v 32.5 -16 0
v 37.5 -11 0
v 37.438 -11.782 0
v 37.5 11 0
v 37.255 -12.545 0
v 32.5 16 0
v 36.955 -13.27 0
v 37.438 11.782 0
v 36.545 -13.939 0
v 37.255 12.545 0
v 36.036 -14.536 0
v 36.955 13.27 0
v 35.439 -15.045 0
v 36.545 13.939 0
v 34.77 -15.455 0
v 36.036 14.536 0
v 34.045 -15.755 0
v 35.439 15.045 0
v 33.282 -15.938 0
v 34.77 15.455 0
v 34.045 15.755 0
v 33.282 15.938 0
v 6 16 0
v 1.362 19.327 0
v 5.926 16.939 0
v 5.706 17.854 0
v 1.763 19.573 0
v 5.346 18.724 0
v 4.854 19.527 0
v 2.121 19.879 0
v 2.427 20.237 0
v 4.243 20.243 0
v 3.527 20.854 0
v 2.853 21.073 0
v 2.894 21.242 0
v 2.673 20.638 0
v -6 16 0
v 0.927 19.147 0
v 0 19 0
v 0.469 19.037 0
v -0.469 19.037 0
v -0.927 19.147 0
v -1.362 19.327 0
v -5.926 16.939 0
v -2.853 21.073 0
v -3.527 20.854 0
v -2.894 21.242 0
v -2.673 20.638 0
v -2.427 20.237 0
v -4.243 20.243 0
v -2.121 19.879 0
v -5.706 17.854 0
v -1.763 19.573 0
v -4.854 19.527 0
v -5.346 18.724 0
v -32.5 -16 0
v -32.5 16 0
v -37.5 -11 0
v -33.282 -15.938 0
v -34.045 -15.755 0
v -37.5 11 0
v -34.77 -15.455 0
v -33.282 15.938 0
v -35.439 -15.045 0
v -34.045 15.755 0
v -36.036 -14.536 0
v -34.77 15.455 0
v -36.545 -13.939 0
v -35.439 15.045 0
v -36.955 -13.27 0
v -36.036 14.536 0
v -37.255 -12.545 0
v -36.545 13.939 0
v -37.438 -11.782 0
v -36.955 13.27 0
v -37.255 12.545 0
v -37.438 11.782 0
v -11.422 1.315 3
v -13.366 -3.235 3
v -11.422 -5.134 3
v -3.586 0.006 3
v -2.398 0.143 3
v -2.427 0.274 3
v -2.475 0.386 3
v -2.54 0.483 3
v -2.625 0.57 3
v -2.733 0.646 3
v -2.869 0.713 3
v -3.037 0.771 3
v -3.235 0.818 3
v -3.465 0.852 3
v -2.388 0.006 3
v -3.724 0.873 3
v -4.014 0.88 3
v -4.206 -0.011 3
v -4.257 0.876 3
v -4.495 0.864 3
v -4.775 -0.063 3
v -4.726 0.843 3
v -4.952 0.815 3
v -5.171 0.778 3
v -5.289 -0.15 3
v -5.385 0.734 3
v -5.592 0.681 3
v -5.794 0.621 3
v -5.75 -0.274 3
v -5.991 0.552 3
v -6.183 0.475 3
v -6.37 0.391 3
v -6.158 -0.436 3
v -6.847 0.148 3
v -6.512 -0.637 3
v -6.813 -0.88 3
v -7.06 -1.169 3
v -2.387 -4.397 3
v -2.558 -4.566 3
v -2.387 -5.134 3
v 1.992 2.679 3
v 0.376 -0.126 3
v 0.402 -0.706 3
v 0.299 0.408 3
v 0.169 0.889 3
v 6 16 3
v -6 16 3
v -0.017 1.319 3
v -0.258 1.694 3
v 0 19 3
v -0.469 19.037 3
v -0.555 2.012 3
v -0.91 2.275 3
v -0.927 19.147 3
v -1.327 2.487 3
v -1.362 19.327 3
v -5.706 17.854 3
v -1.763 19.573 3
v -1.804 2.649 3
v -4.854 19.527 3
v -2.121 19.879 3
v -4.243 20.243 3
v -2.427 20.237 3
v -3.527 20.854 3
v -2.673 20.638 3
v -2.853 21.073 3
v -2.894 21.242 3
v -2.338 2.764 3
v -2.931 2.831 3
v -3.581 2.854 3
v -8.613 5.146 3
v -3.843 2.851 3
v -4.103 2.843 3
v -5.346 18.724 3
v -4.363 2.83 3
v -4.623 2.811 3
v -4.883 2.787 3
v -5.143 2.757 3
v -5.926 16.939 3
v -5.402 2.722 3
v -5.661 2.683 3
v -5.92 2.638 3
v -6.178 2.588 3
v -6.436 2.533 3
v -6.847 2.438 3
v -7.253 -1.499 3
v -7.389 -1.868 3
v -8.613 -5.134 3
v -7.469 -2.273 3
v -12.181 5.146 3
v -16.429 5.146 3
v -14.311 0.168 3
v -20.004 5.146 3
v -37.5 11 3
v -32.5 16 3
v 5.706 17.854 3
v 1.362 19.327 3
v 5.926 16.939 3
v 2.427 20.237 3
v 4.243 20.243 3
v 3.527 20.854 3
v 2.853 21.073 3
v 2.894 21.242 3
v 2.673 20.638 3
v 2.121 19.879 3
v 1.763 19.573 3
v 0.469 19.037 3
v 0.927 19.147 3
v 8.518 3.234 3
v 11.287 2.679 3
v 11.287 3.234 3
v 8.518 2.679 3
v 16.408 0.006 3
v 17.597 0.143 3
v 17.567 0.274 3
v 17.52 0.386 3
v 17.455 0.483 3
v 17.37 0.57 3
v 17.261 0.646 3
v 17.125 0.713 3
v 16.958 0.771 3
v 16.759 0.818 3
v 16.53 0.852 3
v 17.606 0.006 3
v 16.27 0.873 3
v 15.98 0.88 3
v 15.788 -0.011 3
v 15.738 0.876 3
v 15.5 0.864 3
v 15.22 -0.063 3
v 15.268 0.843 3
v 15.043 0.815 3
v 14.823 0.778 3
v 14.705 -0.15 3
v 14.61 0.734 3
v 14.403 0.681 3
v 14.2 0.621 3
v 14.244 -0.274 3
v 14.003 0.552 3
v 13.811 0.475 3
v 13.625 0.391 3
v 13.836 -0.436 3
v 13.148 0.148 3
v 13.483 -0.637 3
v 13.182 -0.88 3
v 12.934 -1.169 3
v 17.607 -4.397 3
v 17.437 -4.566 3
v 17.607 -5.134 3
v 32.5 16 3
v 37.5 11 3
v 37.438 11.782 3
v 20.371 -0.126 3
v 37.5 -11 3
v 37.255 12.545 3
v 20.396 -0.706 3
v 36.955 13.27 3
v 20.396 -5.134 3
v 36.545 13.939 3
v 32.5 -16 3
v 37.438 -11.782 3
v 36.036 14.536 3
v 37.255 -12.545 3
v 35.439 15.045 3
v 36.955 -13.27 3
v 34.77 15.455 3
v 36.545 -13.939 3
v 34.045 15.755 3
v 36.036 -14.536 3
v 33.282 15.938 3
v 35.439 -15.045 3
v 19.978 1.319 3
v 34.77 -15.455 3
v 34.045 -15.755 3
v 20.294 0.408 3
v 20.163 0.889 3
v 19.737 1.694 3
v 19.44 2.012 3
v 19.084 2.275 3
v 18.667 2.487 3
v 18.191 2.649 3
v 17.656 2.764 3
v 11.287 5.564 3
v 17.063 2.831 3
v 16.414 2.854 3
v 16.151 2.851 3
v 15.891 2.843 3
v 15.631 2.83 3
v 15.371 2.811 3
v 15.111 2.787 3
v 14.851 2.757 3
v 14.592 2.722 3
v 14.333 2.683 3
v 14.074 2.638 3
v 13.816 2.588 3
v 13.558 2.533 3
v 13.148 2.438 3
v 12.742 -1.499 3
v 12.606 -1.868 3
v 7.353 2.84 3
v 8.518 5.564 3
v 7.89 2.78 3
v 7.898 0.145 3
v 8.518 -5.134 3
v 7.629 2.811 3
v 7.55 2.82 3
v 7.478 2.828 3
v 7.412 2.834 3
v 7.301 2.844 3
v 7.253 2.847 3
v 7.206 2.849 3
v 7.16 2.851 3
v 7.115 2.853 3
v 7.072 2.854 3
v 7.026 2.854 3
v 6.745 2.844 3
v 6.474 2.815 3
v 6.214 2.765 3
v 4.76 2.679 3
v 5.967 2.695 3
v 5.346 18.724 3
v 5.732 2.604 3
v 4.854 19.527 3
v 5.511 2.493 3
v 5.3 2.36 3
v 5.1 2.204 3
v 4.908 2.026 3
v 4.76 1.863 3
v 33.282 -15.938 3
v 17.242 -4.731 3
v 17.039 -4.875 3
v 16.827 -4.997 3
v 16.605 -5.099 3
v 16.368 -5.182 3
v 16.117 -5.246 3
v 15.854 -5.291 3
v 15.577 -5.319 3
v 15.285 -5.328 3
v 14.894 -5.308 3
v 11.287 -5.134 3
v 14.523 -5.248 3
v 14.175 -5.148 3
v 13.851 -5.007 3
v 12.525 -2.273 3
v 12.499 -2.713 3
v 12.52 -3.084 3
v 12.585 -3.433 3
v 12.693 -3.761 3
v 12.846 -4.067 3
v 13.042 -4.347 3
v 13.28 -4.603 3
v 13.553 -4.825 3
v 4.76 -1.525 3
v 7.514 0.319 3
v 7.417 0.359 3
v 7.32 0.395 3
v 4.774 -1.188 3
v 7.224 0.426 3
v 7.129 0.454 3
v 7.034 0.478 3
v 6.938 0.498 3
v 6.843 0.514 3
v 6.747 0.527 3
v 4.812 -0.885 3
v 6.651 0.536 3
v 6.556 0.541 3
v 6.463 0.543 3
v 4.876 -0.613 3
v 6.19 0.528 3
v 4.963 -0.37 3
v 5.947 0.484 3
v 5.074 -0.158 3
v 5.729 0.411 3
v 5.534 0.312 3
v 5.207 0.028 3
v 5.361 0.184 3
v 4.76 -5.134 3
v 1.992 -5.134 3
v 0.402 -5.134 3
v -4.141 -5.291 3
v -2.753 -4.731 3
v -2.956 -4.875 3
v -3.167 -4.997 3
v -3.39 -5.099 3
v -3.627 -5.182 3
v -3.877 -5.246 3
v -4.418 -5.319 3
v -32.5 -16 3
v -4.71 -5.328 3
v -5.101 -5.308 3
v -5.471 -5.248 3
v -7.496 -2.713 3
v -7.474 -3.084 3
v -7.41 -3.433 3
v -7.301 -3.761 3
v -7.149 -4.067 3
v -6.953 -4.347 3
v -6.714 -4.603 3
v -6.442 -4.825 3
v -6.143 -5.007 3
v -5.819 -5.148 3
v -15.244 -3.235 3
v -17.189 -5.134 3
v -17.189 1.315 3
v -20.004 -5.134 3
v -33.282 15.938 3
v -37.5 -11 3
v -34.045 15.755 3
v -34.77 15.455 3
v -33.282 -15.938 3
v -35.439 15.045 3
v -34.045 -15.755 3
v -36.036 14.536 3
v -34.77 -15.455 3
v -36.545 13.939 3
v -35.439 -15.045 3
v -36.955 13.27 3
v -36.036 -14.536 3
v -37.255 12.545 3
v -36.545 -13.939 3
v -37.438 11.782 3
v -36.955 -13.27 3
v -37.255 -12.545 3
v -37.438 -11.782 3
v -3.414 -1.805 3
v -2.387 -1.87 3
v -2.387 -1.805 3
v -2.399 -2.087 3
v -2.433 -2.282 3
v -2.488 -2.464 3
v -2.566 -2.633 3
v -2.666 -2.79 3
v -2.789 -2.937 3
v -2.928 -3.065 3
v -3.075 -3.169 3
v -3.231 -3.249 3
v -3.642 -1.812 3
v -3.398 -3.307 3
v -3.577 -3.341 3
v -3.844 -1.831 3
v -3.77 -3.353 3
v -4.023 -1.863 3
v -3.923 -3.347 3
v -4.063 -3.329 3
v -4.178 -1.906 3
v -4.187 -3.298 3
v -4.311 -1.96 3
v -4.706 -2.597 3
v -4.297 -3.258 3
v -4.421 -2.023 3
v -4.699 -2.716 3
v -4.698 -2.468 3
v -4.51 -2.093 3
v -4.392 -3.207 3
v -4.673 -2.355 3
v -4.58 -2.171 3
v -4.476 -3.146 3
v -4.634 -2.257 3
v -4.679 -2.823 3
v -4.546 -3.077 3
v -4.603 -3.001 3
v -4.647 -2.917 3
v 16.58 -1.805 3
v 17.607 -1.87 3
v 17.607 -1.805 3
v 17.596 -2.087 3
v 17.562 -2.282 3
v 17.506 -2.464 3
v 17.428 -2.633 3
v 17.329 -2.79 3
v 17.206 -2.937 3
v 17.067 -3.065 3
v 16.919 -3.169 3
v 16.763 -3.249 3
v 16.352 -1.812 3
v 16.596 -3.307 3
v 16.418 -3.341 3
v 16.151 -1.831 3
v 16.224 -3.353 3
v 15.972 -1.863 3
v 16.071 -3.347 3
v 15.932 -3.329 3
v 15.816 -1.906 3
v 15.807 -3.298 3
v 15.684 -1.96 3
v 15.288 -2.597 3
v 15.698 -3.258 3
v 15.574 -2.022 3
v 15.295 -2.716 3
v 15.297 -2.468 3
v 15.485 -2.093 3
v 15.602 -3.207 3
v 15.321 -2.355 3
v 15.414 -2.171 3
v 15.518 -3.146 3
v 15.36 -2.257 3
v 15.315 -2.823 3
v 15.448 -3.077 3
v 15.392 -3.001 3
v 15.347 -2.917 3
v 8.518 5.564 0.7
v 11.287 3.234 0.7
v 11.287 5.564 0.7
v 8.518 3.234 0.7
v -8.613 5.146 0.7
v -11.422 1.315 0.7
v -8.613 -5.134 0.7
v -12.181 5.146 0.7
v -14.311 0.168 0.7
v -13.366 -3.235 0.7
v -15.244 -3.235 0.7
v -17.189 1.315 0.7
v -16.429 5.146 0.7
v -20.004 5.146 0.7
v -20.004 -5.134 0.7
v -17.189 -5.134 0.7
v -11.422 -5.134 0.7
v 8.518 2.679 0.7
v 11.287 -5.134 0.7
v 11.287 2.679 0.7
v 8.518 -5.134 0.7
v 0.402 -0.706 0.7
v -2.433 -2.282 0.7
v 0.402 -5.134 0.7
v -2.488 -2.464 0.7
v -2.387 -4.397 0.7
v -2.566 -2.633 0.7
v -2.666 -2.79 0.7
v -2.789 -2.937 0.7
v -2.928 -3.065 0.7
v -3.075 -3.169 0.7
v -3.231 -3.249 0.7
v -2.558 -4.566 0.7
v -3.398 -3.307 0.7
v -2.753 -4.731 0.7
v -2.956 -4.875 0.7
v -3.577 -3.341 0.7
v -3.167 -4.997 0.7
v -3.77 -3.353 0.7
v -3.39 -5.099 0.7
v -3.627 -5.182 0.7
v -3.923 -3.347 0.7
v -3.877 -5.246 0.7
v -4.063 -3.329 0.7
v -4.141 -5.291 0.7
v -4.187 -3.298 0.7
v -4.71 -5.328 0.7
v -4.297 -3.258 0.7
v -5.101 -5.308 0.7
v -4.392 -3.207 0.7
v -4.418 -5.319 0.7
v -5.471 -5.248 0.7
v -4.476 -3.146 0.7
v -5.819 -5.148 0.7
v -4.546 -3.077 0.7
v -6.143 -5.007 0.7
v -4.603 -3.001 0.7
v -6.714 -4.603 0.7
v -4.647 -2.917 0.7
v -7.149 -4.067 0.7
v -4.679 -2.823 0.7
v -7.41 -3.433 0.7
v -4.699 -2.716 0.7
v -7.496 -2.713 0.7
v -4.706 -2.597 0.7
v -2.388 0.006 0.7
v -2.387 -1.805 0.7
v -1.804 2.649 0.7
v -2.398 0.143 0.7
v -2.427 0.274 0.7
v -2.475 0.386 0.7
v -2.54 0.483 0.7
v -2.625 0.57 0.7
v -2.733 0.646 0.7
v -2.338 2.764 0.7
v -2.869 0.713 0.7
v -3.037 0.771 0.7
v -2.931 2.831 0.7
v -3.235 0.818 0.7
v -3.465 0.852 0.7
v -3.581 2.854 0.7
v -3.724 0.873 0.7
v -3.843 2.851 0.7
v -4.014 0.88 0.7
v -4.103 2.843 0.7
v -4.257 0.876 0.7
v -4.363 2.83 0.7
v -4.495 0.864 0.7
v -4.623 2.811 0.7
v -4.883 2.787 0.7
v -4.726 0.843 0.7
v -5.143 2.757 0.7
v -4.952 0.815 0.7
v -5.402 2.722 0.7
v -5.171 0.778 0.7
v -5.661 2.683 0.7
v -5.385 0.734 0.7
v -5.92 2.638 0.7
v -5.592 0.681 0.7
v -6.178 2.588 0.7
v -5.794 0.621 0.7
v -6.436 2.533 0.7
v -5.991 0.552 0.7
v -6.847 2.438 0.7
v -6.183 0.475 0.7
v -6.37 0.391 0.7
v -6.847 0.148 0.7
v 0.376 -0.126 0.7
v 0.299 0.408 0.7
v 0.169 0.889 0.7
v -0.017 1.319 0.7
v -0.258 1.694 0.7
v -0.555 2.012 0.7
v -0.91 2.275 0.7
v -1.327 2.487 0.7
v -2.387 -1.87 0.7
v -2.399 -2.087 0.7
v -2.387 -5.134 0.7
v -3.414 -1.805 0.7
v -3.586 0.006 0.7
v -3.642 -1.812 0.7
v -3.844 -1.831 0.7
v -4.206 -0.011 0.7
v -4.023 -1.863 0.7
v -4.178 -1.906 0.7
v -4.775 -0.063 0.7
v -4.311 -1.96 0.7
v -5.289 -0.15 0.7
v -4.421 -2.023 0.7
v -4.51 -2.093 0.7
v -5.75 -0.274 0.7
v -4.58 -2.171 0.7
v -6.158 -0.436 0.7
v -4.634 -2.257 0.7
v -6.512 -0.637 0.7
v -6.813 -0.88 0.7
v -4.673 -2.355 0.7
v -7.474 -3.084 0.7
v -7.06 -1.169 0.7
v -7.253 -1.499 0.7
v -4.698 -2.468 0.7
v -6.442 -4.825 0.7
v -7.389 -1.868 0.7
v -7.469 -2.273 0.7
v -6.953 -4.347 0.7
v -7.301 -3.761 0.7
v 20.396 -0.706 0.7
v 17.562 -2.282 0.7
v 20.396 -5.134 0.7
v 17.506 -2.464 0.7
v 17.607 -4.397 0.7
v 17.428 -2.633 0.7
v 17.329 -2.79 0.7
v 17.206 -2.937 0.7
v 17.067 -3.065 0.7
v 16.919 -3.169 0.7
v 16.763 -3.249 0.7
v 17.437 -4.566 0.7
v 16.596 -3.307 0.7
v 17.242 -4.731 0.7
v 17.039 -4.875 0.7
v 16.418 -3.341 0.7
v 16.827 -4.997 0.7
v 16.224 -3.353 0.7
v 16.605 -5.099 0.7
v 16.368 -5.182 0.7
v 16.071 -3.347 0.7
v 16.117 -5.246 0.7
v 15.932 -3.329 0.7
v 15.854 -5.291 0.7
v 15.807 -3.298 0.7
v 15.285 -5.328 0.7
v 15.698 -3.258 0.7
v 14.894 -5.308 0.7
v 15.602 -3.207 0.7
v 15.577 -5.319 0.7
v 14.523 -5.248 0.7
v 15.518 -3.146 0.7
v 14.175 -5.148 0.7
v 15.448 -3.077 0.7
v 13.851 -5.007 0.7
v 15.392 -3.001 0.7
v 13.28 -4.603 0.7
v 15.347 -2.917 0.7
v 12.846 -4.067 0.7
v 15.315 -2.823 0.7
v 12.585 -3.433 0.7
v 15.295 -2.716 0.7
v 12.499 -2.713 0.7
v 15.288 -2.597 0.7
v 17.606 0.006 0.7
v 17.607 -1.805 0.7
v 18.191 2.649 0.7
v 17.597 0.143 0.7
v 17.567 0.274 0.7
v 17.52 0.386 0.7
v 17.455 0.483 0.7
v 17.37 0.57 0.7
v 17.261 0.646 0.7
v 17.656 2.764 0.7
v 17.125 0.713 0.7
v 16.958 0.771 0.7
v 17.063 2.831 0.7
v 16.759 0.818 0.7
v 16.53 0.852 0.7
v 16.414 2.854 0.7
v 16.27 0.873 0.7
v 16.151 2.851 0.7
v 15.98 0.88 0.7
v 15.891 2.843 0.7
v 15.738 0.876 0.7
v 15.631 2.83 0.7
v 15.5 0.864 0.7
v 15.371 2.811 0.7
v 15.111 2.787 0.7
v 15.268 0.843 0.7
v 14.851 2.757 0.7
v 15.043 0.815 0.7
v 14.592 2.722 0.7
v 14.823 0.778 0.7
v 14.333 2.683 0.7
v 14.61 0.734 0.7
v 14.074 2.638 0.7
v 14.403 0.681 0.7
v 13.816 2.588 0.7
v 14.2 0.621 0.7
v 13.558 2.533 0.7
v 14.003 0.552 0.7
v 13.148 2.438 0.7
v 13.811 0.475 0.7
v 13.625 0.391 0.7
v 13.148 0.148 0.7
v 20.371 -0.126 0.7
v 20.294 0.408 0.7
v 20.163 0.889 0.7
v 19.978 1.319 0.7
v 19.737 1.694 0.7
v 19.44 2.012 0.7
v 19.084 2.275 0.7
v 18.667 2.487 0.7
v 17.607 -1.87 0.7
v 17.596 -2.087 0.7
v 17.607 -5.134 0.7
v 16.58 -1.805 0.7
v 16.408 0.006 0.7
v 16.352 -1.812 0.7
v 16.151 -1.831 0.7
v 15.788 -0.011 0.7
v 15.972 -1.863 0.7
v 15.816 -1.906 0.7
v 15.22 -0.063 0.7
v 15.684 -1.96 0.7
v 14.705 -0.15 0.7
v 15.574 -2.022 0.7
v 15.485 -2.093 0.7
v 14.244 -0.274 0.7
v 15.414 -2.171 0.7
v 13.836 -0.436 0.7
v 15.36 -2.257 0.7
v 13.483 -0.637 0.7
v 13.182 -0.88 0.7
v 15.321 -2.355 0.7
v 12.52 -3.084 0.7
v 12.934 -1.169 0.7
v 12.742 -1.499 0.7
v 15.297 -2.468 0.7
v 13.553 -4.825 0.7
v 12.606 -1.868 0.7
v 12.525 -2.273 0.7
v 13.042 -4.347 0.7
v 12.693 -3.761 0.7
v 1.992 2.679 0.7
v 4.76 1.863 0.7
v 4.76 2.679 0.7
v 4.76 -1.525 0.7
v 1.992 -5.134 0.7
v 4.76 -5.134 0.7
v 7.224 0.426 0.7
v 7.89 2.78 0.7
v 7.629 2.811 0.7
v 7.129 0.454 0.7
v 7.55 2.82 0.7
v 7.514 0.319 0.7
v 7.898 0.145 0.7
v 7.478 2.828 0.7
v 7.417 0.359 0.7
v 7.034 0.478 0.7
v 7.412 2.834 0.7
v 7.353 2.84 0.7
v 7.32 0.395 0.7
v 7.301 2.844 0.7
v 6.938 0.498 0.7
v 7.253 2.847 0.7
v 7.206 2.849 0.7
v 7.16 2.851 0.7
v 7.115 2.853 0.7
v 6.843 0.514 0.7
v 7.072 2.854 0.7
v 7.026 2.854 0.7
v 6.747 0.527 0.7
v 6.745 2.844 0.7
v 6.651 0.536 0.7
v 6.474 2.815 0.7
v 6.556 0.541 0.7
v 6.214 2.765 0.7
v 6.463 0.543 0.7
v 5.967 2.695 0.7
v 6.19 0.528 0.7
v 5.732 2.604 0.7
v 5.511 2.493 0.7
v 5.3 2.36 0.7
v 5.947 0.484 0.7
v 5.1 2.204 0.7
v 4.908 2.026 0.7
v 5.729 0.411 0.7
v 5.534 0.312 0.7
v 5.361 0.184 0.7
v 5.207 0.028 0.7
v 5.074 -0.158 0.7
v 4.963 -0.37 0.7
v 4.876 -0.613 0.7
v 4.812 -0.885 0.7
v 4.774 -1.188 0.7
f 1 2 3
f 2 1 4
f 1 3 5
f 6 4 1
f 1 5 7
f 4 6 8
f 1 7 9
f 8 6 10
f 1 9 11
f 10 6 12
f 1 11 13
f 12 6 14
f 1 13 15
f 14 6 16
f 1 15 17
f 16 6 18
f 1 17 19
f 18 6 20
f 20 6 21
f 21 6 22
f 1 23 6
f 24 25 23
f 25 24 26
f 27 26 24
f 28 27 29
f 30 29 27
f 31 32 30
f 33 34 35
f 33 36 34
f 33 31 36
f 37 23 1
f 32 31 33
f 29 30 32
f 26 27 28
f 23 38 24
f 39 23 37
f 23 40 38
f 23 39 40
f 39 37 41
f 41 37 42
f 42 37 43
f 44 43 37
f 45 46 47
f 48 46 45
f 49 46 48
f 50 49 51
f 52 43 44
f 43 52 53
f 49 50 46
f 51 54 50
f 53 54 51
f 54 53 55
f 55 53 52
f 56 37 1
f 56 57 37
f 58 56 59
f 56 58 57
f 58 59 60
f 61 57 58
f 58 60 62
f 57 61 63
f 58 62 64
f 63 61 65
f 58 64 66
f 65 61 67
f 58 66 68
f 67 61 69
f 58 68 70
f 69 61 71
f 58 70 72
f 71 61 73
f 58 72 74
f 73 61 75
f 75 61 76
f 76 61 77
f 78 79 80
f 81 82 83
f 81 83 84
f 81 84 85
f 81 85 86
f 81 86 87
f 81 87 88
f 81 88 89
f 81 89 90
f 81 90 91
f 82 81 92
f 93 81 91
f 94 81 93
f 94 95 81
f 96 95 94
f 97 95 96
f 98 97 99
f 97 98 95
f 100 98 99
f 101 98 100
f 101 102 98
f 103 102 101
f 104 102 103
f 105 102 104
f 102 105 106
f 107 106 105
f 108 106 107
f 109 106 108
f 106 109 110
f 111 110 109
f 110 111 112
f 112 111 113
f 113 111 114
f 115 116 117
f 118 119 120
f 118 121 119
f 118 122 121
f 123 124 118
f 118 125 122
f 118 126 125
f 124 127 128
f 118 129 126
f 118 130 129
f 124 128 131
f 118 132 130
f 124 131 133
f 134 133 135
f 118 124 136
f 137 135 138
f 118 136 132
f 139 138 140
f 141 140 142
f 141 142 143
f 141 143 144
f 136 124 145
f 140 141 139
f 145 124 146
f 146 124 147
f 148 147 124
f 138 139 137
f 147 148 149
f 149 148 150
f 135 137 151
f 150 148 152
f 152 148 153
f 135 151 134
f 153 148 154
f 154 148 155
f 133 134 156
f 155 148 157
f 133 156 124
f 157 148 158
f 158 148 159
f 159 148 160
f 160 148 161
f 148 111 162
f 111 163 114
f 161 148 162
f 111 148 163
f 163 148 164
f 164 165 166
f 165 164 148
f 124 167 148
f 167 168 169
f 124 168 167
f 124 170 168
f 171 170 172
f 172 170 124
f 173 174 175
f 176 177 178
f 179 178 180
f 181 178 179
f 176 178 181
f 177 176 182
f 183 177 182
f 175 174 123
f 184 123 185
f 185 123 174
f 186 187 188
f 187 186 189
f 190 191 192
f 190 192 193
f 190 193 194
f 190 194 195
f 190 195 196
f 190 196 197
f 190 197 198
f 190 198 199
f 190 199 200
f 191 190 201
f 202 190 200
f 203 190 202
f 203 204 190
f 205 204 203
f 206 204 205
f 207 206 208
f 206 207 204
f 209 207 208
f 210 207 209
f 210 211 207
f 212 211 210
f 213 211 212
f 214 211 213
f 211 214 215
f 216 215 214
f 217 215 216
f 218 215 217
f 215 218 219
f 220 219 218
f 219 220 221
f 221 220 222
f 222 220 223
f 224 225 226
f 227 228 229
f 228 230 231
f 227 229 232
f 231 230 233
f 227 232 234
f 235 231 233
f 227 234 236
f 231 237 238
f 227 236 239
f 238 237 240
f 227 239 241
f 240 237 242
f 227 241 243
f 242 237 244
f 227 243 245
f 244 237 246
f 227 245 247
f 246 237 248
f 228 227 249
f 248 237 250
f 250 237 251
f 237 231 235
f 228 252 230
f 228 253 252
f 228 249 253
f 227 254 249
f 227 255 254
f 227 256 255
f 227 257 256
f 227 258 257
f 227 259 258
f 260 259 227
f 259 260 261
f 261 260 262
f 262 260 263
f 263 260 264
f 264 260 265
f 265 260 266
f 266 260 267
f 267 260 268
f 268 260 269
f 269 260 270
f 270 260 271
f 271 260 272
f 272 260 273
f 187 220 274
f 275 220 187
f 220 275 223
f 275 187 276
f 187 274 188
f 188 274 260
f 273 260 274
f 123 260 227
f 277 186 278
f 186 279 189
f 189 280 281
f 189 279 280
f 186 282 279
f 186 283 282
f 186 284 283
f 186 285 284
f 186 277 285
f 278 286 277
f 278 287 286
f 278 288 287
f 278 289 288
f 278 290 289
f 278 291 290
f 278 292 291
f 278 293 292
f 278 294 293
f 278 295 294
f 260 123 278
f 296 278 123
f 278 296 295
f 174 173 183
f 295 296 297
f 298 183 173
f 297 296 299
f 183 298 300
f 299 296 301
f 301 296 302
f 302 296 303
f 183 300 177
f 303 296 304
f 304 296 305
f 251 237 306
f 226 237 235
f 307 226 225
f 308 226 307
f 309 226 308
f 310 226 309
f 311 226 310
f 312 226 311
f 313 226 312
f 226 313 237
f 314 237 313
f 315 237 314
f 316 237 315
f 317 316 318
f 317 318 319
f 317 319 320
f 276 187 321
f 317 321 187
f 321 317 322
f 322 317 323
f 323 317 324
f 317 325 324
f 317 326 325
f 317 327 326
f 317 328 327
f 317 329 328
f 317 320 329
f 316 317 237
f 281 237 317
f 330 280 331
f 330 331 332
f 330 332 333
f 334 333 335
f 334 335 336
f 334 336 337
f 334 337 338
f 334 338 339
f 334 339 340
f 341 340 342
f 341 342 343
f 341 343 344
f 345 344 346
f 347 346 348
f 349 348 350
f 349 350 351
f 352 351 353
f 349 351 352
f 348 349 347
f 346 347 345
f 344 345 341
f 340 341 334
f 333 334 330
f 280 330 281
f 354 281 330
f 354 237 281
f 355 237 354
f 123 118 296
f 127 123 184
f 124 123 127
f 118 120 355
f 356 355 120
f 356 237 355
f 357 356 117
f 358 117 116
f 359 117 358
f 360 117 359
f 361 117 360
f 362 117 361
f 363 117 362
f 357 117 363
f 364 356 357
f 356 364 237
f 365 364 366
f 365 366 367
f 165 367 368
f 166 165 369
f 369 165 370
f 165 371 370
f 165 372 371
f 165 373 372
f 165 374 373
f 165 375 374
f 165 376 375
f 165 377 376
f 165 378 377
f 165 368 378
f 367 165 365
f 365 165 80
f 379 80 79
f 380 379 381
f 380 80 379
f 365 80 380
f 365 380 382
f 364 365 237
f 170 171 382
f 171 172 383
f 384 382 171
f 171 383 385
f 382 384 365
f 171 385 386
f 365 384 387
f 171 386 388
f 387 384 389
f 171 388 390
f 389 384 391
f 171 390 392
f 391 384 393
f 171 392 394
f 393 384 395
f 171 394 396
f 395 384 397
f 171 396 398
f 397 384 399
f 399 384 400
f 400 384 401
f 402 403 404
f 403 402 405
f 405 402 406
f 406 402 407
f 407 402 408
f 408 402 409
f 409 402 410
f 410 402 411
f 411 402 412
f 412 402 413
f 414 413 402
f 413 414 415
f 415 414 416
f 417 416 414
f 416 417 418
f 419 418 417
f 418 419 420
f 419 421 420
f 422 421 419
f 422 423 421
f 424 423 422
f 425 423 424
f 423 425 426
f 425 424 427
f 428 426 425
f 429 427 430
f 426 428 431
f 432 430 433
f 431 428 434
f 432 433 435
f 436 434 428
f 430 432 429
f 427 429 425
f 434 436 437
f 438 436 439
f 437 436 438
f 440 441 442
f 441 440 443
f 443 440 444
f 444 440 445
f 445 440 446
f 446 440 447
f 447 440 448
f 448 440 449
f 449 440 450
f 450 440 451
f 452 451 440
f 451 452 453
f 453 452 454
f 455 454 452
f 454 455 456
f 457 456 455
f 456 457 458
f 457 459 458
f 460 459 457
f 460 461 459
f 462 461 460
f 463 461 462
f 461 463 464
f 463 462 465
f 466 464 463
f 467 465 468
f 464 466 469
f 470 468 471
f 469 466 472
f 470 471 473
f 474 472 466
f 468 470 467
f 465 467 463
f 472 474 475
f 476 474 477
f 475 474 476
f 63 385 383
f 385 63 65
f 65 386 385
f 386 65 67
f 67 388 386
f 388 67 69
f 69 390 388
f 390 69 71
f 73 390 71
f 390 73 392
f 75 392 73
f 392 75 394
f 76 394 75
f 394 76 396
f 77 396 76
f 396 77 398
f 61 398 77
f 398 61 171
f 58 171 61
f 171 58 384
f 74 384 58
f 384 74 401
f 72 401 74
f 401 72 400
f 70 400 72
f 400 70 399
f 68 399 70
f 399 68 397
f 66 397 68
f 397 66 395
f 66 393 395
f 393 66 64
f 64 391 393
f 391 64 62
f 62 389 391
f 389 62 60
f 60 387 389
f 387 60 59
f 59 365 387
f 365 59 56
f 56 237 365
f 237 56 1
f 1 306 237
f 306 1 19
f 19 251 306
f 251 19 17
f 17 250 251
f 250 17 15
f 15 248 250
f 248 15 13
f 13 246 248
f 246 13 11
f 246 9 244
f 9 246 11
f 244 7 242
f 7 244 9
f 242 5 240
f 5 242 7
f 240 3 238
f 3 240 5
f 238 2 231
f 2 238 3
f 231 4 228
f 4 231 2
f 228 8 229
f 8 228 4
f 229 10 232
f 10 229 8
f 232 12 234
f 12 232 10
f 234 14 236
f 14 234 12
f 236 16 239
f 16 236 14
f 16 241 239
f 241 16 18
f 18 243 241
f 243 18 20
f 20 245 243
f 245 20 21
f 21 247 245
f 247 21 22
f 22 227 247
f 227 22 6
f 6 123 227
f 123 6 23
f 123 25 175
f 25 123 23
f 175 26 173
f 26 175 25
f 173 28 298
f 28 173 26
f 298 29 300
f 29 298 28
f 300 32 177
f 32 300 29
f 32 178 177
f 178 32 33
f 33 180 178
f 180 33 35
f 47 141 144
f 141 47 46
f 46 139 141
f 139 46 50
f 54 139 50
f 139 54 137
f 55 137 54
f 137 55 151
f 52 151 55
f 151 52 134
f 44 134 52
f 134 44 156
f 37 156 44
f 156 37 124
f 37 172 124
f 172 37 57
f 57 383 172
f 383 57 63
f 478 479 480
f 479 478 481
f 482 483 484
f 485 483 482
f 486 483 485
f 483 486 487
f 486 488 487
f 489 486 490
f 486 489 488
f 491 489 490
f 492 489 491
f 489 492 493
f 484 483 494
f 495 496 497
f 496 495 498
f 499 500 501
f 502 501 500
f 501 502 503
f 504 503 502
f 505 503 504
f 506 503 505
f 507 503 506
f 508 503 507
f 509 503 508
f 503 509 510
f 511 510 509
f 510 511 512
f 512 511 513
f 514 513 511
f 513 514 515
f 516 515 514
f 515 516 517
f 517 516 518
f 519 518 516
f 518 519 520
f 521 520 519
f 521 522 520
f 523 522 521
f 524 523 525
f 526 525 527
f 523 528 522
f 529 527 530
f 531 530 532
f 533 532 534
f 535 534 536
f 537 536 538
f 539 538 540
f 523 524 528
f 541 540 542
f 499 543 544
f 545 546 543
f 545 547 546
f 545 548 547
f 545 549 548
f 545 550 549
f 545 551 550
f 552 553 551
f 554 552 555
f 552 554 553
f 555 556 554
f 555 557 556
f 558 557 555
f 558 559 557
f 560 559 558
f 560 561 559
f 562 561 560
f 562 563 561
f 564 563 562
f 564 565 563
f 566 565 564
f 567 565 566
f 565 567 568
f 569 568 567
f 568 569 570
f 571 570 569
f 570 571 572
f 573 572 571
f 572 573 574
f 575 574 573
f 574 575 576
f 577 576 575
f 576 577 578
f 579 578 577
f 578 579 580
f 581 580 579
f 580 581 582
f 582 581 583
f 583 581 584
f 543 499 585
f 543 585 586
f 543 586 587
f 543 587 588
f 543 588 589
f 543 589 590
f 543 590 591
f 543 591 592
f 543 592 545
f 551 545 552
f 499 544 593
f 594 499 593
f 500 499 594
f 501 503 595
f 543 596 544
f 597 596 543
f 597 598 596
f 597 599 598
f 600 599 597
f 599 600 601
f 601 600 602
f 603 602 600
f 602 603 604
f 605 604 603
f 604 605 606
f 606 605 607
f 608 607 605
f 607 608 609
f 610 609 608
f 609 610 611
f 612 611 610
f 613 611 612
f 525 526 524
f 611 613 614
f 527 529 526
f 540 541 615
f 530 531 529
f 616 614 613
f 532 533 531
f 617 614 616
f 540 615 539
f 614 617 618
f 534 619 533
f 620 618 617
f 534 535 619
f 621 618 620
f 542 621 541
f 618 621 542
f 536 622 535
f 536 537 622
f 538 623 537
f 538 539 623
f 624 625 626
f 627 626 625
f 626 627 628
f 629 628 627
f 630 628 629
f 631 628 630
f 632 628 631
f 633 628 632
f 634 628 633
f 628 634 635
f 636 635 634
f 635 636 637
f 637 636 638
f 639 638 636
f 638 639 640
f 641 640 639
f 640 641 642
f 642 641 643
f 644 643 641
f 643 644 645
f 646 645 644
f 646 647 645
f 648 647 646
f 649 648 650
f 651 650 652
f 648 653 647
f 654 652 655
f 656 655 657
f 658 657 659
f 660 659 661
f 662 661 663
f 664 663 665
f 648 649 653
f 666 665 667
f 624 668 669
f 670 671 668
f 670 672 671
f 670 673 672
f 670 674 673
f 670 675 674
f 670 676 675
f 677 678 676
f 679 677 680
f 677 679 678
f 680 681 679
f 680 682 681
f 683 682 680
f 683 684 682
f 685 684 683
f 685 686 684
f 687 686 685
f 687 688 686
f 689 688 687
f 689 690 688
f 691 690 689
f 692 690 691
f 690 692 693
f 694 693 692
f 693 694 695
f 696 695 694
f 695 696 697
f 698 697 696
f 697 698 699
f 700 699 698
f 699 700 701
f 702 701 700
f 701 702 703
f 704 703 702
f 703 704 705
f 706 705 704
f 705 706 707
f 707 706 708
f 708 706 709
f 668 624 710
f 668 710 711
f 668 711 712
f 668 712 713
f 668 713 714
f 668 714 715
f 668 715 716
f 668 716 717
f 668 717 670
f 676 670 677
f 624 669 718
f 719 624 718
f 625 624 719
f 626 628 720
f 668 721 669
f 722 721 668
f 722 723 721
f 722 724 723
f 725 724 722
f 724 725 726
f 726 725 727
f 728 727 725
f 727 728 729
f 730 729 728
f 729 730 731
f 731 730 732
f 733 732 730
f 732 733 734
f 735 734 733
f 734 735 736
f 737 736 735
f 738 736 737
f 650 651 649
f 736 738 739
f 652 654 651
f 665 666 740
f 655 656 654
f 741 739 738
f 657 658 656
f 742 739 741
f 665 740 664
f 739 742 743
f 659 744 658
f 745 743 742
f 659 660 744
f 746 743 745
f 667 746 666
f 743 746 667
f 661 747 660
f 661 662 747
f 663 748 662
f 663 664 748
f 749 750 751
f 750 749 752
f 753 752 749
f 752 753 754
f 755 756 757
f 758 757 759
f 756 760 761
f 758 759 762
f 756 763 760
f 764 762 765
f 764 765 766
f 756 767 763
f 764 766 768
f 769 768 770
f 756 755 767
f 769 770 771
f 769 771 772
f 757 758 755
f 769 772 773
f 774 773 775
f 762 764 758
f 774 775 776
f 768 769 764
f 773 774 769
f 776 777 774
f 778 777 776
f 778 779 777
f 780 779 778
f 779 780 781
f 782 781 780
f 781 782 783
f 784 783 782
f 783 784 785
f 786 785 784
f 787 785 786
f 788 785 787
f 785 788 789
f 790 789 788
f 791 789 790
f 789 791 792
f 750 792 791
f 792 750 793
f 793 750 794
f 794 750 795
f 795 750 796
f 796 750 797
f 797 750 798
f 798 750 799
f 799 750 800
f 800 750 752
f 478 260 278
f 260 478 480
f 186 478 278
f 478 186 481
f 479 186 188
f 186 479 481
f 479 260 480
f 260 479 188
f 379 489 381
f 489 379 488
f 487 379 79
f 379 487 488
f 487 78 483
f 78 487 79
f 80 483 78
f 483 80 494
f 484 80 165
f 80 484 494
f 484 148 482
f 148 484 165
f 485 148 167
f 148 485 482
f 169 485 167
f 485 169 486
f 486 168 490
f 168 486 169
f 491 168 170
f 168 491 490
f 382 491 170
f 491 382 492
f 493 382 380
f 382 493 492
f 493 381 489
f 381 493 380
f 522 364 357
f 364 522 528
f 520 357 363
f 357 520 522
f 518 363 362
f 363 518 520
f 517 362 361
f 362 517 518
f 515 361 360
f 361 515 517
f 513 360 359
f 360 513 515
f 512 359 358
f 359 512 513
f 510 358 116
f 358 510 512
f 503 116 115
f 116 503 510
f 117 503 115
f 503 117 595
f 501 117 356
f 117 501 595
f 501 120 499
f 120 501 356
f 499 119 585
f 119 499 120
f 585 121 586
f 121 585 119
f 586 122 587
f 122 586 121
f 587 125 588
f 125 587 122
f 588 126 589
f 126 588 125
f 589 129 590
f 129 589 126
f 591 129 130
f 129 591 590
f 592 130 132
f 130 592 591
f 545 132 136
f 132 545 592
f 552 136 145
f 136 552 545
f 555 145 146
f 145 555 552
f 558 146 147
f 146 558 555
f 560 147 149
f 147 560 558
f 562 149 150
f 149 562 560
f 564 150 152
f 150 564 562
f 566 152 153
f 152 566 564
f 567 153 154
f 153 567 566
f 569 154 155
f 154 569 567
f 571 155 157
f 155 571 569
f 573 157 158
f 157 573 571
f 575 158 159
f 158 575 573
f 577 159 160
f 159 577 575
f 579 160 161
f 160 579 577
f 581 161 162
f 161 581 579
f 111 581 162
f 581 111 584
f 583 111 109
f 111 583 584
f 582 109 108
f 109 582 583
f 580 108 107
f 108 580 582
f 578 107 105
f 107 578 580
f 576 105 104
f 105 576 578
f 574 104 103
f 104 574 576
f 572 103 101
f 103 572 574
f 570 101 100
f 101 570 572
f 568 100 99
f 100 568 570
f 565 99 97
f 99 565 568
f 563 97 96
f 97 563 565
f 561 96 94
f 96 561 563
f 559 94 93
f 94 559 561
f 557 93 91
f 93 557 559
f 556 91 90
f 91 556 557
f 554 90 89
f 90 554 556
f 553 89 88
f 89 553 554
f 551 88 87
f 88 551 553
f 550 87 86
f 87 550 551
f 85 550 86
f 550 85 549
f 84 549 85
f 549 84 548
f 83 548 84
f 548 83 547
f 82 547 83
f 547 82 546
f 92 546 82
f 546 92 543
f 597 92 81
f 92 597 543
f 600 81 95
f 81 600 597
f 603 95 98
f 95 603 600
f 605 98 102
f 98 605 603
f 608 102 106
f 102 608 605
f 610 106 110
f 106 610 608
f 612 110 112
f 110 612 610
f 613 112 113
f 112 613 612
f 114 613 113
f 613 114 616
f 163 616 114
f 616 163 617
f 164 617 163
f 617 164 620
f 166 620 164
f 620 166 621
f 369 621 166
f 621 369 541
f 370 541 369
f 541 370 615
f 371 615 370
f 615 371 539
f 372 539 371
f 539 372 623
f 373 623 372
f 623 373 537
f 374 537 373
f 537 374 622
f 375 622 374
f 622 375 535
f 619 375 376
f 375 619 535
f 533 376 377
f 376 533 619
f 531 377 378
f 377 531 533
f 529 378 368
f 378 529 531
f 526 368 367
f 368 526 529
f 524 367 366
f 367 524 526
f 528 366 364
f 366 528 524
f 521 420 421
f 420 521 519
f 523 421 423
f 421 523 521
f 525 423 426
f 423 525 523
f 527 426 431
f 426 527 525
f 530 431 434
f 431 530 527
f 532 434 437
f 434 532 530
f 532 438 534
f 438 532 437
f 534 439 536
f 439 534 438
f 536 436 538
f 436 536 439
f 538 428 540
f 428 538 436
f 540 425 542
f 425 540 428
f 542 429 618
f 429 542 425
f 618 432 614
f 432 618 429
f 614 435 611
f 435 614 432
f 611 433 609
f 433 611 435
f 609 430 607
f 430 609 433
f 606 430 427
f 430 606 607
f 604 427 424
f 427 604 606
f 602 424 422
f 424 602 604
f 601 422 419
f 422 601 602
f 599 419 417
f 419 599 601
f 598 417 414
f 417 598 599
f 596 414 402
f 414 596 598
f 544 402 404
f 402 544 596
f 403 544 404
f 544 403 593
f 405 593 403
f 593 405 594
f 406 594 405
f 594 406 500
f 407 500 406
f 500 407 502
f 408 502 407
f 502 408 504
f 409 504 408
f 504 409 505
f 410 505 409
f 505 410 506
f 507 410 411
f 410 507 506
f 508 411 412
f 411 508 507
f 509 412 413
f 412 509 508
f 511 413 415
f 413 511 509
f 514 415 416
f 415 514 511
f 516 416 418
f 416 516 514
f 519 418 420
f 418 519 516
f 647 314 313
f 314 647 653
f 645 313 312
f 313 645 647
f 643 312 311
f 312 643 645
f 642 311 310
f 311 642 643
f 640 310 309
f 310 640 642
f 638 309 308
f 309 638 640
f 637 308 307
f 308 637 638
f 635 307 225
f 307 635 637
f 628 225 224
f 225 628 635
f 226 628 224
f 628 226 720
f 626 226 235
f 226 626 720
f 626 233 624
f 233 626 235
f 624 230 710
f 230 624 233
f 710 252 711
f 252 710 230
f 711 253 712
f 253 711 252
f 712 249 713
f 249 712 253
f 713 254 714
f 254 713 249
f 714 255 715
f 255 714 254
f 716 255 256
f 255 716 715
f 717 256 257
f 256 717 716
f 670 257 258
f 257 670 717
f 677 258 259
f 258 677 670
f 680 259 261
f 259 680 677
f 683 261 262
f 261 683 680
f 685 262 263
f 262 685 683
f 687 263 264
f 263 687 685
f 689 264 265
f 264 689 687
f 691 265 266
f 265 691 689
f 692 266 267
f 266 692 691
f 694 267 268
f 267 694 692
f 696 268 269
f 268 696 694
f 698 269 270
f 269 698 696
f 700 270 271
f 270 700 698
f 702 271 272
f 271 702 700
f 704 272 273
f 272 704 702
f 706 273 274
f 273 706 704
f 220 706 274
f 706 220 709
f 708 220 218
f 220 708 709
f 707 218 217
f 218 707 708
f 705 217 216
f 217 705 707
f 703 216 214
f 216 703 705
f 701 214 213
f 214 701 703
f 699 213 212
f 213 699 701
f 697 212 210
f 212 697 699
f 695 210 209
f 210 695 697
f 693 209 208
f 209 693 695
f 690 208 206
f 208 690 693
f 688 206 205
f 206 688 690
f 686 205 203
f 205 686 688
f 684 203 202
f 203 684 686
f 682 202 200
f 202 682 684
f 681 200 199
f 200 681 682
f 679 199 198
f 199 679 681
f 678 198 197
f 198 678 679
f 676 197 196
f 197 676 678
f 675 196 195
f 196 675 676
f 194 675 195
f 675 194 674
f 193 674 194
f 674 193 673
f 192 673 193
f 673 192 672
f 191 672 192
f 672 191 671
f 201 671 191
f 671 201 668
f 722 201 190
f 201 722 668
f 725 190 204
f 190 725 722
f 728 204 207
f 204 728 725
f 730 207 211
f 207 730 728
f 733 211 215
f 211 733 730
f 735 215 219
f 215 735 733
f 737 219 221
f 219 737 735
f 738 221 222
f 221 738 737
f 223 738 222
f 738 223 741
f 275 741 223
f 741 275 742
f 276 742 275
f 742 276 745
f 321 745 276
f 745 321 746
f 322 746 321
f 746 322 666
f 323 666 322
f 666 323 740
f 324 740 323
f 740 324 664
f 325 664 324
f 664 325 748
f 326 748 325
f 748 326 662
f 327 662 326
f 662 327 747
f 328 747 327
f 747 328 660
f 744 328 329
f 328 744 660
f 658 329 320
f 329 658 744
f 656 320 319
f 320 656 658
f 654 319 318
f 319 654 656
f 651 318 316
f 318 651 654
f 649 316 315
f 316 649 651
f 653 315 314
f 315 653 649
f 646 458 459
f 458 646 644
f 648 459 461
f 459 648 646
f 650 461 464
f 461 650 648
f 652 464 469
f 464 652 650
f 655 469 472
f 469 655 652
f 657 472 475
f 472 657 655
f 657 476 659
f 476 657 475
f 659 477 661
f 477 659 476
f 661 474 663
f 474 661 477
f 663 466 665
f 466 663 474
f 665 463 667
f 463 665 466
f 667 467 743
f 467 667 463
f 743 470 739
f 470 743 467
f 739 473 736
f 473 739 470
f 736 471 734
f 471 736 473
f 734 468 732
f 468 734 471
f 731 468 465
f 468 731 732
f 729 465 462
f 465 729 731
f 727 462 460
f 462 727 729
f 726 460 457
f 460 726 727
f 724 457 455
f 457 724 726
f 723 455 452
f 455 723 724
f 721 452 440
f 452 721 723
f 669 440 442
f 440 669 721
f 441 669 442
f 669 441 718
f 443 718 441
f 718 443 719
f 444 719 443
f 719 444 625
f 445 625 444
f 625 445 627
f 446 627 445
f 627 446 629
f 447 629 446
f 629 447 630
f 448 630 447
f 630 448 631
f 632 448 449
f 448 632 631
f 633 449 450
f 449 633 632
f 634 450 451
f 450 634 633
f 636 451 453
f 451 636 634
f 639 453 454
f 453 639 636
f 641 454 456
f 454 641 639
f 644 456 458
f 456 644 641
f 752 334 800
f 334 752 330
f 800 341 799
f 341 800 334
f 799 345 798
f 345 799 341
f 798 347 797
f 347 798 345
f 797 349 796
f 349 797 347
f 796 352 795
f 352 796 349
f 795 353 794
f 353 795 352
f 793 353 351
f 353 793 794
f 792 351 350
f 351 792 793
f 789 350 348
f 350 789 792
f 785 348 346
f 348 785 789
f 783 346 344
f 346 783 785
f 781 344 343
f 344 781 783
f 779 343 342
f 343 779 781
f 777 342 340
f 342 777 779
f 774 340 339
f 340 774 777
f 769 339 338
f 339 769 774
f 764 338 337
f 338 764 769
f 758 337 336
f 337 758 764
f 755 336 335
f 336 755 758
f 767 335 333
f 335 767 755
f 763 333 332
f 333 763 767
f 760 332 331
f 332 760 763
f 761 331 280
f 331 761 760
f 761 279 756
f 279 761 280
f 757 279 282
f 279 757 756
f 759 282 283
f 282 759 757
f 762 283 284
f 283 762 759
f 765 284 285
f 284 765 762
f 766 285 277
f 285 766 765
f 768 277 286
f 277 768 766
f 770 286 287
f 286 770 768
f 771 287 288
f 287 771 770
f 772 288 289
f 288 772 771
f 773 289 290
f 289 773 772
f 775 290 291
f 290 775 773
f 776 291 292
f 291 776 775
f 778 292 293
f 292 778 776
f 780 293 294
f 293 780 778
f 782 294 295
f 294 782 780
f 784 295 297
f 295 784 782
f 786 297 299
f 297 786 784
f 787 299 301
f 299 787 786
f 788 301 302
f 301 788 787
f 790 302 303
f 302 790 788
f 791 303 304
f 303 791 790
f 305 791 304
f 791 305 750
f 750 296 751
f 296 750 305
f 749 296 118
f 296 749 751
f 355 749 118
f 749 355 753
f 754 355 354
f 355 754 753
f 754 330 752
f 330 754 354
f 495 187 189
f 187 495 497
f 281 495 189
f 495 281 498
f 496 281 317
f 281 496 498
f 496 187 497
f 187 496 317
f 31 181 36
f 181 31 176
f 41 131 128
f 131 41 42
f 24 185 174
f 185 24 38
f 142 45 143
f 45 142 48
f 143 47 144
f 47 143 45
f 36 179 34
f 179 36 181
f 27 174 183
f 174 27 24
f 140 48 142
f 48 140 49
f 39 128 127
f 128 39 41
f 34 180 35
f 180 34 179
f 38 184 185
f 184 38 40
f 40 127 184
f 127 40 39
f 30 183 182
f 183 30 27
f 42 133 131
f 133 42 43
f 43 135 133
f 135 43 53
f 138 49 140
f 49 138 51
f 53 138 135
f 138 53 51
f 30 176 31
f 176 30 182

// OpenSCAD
// Text Offset Keychain - 3 Colors

// --- Parameters ---
Name          = "Maria";
Font          = "Bebas Neue";
Name_Size     = 40;
Rect_Width    = 75;
Rect_Height   = 32;
Corner_Radius = 5;
Offset        = 1.5;
Tolerance     = 0.2;
Base_Height   = 3;
Layer_Height  = 2.5;
Ring_Hole_D   = 6;
Part          = "Base";

$fn = 40;

module name_shape(txt, fnt) {
  resize([Name_Size, 0, 0], auto=true)
  text(txt, size=16, font=fnt, halign="center", valign="center");
}

module rect_2d(w, h, r) {
  offset(r=r) offset(-r)
  square([w, h], center=true);
}

module body_2d() {
  union() {
    rect_2d(Rect_Width, Rect_Height, Corner_Radius);
    hull() {
      translate([0, Rect_Height / 2])
      circle(d=Ring_Hole_D + 6);
      translate([0, Rect_Height / 2 - 3])
      square([Ring_Hole_D + 6, 1], center=true);
    }
  }
}

module ring_hole_cut() {
  translate([0, Rect_Height / 2 + Ring_Hole_D / 2 + 3, -0.5])
  linear_extrude(Base_Height + Layer_Height * 2 + 1)
  circle(d=Ring_Hole_D);
}

module base_part() {
  difference() {
    linear_extrude(Base_Height)
    body_2d();

    translate([0, 0, Base_Height - Layer_Height + Tolerance])
    linear_extrude(Layer_Height + 1)
    offset(delta=Tolerance)
    name_shape(Name, str(Font, ":style=Bold"));

    ring_hole_cut();
  }
}

module middle_part() {
  difference() {
    linear_extrude(Layer_Height)
    offset(delta=Offset)
    name_shape(Name, str(Font, ":style=Bold"));

    translate([0, 0, Layer_Height - Layer_Height + Tolerance])
    linear_extrude(Layer_Height + 1)
    offset(delta=Tolerance)
    name_shape(Name, str(Font, ":style=Bold"));
  }
}

module top_part() {
  linear_extrude(Layer_Height)
  name_shape(Name, str(Font, ":style=Bold"));
}

if (Part == "Base") {
  base_part();
} else if (Part == "Middle") {
  translate([0, 0, Base_Height])
  middle_part();
} else if (Part == "Top") {
  translate([0, 0, Base_Height + Layer_Height])
  top_part();
}
